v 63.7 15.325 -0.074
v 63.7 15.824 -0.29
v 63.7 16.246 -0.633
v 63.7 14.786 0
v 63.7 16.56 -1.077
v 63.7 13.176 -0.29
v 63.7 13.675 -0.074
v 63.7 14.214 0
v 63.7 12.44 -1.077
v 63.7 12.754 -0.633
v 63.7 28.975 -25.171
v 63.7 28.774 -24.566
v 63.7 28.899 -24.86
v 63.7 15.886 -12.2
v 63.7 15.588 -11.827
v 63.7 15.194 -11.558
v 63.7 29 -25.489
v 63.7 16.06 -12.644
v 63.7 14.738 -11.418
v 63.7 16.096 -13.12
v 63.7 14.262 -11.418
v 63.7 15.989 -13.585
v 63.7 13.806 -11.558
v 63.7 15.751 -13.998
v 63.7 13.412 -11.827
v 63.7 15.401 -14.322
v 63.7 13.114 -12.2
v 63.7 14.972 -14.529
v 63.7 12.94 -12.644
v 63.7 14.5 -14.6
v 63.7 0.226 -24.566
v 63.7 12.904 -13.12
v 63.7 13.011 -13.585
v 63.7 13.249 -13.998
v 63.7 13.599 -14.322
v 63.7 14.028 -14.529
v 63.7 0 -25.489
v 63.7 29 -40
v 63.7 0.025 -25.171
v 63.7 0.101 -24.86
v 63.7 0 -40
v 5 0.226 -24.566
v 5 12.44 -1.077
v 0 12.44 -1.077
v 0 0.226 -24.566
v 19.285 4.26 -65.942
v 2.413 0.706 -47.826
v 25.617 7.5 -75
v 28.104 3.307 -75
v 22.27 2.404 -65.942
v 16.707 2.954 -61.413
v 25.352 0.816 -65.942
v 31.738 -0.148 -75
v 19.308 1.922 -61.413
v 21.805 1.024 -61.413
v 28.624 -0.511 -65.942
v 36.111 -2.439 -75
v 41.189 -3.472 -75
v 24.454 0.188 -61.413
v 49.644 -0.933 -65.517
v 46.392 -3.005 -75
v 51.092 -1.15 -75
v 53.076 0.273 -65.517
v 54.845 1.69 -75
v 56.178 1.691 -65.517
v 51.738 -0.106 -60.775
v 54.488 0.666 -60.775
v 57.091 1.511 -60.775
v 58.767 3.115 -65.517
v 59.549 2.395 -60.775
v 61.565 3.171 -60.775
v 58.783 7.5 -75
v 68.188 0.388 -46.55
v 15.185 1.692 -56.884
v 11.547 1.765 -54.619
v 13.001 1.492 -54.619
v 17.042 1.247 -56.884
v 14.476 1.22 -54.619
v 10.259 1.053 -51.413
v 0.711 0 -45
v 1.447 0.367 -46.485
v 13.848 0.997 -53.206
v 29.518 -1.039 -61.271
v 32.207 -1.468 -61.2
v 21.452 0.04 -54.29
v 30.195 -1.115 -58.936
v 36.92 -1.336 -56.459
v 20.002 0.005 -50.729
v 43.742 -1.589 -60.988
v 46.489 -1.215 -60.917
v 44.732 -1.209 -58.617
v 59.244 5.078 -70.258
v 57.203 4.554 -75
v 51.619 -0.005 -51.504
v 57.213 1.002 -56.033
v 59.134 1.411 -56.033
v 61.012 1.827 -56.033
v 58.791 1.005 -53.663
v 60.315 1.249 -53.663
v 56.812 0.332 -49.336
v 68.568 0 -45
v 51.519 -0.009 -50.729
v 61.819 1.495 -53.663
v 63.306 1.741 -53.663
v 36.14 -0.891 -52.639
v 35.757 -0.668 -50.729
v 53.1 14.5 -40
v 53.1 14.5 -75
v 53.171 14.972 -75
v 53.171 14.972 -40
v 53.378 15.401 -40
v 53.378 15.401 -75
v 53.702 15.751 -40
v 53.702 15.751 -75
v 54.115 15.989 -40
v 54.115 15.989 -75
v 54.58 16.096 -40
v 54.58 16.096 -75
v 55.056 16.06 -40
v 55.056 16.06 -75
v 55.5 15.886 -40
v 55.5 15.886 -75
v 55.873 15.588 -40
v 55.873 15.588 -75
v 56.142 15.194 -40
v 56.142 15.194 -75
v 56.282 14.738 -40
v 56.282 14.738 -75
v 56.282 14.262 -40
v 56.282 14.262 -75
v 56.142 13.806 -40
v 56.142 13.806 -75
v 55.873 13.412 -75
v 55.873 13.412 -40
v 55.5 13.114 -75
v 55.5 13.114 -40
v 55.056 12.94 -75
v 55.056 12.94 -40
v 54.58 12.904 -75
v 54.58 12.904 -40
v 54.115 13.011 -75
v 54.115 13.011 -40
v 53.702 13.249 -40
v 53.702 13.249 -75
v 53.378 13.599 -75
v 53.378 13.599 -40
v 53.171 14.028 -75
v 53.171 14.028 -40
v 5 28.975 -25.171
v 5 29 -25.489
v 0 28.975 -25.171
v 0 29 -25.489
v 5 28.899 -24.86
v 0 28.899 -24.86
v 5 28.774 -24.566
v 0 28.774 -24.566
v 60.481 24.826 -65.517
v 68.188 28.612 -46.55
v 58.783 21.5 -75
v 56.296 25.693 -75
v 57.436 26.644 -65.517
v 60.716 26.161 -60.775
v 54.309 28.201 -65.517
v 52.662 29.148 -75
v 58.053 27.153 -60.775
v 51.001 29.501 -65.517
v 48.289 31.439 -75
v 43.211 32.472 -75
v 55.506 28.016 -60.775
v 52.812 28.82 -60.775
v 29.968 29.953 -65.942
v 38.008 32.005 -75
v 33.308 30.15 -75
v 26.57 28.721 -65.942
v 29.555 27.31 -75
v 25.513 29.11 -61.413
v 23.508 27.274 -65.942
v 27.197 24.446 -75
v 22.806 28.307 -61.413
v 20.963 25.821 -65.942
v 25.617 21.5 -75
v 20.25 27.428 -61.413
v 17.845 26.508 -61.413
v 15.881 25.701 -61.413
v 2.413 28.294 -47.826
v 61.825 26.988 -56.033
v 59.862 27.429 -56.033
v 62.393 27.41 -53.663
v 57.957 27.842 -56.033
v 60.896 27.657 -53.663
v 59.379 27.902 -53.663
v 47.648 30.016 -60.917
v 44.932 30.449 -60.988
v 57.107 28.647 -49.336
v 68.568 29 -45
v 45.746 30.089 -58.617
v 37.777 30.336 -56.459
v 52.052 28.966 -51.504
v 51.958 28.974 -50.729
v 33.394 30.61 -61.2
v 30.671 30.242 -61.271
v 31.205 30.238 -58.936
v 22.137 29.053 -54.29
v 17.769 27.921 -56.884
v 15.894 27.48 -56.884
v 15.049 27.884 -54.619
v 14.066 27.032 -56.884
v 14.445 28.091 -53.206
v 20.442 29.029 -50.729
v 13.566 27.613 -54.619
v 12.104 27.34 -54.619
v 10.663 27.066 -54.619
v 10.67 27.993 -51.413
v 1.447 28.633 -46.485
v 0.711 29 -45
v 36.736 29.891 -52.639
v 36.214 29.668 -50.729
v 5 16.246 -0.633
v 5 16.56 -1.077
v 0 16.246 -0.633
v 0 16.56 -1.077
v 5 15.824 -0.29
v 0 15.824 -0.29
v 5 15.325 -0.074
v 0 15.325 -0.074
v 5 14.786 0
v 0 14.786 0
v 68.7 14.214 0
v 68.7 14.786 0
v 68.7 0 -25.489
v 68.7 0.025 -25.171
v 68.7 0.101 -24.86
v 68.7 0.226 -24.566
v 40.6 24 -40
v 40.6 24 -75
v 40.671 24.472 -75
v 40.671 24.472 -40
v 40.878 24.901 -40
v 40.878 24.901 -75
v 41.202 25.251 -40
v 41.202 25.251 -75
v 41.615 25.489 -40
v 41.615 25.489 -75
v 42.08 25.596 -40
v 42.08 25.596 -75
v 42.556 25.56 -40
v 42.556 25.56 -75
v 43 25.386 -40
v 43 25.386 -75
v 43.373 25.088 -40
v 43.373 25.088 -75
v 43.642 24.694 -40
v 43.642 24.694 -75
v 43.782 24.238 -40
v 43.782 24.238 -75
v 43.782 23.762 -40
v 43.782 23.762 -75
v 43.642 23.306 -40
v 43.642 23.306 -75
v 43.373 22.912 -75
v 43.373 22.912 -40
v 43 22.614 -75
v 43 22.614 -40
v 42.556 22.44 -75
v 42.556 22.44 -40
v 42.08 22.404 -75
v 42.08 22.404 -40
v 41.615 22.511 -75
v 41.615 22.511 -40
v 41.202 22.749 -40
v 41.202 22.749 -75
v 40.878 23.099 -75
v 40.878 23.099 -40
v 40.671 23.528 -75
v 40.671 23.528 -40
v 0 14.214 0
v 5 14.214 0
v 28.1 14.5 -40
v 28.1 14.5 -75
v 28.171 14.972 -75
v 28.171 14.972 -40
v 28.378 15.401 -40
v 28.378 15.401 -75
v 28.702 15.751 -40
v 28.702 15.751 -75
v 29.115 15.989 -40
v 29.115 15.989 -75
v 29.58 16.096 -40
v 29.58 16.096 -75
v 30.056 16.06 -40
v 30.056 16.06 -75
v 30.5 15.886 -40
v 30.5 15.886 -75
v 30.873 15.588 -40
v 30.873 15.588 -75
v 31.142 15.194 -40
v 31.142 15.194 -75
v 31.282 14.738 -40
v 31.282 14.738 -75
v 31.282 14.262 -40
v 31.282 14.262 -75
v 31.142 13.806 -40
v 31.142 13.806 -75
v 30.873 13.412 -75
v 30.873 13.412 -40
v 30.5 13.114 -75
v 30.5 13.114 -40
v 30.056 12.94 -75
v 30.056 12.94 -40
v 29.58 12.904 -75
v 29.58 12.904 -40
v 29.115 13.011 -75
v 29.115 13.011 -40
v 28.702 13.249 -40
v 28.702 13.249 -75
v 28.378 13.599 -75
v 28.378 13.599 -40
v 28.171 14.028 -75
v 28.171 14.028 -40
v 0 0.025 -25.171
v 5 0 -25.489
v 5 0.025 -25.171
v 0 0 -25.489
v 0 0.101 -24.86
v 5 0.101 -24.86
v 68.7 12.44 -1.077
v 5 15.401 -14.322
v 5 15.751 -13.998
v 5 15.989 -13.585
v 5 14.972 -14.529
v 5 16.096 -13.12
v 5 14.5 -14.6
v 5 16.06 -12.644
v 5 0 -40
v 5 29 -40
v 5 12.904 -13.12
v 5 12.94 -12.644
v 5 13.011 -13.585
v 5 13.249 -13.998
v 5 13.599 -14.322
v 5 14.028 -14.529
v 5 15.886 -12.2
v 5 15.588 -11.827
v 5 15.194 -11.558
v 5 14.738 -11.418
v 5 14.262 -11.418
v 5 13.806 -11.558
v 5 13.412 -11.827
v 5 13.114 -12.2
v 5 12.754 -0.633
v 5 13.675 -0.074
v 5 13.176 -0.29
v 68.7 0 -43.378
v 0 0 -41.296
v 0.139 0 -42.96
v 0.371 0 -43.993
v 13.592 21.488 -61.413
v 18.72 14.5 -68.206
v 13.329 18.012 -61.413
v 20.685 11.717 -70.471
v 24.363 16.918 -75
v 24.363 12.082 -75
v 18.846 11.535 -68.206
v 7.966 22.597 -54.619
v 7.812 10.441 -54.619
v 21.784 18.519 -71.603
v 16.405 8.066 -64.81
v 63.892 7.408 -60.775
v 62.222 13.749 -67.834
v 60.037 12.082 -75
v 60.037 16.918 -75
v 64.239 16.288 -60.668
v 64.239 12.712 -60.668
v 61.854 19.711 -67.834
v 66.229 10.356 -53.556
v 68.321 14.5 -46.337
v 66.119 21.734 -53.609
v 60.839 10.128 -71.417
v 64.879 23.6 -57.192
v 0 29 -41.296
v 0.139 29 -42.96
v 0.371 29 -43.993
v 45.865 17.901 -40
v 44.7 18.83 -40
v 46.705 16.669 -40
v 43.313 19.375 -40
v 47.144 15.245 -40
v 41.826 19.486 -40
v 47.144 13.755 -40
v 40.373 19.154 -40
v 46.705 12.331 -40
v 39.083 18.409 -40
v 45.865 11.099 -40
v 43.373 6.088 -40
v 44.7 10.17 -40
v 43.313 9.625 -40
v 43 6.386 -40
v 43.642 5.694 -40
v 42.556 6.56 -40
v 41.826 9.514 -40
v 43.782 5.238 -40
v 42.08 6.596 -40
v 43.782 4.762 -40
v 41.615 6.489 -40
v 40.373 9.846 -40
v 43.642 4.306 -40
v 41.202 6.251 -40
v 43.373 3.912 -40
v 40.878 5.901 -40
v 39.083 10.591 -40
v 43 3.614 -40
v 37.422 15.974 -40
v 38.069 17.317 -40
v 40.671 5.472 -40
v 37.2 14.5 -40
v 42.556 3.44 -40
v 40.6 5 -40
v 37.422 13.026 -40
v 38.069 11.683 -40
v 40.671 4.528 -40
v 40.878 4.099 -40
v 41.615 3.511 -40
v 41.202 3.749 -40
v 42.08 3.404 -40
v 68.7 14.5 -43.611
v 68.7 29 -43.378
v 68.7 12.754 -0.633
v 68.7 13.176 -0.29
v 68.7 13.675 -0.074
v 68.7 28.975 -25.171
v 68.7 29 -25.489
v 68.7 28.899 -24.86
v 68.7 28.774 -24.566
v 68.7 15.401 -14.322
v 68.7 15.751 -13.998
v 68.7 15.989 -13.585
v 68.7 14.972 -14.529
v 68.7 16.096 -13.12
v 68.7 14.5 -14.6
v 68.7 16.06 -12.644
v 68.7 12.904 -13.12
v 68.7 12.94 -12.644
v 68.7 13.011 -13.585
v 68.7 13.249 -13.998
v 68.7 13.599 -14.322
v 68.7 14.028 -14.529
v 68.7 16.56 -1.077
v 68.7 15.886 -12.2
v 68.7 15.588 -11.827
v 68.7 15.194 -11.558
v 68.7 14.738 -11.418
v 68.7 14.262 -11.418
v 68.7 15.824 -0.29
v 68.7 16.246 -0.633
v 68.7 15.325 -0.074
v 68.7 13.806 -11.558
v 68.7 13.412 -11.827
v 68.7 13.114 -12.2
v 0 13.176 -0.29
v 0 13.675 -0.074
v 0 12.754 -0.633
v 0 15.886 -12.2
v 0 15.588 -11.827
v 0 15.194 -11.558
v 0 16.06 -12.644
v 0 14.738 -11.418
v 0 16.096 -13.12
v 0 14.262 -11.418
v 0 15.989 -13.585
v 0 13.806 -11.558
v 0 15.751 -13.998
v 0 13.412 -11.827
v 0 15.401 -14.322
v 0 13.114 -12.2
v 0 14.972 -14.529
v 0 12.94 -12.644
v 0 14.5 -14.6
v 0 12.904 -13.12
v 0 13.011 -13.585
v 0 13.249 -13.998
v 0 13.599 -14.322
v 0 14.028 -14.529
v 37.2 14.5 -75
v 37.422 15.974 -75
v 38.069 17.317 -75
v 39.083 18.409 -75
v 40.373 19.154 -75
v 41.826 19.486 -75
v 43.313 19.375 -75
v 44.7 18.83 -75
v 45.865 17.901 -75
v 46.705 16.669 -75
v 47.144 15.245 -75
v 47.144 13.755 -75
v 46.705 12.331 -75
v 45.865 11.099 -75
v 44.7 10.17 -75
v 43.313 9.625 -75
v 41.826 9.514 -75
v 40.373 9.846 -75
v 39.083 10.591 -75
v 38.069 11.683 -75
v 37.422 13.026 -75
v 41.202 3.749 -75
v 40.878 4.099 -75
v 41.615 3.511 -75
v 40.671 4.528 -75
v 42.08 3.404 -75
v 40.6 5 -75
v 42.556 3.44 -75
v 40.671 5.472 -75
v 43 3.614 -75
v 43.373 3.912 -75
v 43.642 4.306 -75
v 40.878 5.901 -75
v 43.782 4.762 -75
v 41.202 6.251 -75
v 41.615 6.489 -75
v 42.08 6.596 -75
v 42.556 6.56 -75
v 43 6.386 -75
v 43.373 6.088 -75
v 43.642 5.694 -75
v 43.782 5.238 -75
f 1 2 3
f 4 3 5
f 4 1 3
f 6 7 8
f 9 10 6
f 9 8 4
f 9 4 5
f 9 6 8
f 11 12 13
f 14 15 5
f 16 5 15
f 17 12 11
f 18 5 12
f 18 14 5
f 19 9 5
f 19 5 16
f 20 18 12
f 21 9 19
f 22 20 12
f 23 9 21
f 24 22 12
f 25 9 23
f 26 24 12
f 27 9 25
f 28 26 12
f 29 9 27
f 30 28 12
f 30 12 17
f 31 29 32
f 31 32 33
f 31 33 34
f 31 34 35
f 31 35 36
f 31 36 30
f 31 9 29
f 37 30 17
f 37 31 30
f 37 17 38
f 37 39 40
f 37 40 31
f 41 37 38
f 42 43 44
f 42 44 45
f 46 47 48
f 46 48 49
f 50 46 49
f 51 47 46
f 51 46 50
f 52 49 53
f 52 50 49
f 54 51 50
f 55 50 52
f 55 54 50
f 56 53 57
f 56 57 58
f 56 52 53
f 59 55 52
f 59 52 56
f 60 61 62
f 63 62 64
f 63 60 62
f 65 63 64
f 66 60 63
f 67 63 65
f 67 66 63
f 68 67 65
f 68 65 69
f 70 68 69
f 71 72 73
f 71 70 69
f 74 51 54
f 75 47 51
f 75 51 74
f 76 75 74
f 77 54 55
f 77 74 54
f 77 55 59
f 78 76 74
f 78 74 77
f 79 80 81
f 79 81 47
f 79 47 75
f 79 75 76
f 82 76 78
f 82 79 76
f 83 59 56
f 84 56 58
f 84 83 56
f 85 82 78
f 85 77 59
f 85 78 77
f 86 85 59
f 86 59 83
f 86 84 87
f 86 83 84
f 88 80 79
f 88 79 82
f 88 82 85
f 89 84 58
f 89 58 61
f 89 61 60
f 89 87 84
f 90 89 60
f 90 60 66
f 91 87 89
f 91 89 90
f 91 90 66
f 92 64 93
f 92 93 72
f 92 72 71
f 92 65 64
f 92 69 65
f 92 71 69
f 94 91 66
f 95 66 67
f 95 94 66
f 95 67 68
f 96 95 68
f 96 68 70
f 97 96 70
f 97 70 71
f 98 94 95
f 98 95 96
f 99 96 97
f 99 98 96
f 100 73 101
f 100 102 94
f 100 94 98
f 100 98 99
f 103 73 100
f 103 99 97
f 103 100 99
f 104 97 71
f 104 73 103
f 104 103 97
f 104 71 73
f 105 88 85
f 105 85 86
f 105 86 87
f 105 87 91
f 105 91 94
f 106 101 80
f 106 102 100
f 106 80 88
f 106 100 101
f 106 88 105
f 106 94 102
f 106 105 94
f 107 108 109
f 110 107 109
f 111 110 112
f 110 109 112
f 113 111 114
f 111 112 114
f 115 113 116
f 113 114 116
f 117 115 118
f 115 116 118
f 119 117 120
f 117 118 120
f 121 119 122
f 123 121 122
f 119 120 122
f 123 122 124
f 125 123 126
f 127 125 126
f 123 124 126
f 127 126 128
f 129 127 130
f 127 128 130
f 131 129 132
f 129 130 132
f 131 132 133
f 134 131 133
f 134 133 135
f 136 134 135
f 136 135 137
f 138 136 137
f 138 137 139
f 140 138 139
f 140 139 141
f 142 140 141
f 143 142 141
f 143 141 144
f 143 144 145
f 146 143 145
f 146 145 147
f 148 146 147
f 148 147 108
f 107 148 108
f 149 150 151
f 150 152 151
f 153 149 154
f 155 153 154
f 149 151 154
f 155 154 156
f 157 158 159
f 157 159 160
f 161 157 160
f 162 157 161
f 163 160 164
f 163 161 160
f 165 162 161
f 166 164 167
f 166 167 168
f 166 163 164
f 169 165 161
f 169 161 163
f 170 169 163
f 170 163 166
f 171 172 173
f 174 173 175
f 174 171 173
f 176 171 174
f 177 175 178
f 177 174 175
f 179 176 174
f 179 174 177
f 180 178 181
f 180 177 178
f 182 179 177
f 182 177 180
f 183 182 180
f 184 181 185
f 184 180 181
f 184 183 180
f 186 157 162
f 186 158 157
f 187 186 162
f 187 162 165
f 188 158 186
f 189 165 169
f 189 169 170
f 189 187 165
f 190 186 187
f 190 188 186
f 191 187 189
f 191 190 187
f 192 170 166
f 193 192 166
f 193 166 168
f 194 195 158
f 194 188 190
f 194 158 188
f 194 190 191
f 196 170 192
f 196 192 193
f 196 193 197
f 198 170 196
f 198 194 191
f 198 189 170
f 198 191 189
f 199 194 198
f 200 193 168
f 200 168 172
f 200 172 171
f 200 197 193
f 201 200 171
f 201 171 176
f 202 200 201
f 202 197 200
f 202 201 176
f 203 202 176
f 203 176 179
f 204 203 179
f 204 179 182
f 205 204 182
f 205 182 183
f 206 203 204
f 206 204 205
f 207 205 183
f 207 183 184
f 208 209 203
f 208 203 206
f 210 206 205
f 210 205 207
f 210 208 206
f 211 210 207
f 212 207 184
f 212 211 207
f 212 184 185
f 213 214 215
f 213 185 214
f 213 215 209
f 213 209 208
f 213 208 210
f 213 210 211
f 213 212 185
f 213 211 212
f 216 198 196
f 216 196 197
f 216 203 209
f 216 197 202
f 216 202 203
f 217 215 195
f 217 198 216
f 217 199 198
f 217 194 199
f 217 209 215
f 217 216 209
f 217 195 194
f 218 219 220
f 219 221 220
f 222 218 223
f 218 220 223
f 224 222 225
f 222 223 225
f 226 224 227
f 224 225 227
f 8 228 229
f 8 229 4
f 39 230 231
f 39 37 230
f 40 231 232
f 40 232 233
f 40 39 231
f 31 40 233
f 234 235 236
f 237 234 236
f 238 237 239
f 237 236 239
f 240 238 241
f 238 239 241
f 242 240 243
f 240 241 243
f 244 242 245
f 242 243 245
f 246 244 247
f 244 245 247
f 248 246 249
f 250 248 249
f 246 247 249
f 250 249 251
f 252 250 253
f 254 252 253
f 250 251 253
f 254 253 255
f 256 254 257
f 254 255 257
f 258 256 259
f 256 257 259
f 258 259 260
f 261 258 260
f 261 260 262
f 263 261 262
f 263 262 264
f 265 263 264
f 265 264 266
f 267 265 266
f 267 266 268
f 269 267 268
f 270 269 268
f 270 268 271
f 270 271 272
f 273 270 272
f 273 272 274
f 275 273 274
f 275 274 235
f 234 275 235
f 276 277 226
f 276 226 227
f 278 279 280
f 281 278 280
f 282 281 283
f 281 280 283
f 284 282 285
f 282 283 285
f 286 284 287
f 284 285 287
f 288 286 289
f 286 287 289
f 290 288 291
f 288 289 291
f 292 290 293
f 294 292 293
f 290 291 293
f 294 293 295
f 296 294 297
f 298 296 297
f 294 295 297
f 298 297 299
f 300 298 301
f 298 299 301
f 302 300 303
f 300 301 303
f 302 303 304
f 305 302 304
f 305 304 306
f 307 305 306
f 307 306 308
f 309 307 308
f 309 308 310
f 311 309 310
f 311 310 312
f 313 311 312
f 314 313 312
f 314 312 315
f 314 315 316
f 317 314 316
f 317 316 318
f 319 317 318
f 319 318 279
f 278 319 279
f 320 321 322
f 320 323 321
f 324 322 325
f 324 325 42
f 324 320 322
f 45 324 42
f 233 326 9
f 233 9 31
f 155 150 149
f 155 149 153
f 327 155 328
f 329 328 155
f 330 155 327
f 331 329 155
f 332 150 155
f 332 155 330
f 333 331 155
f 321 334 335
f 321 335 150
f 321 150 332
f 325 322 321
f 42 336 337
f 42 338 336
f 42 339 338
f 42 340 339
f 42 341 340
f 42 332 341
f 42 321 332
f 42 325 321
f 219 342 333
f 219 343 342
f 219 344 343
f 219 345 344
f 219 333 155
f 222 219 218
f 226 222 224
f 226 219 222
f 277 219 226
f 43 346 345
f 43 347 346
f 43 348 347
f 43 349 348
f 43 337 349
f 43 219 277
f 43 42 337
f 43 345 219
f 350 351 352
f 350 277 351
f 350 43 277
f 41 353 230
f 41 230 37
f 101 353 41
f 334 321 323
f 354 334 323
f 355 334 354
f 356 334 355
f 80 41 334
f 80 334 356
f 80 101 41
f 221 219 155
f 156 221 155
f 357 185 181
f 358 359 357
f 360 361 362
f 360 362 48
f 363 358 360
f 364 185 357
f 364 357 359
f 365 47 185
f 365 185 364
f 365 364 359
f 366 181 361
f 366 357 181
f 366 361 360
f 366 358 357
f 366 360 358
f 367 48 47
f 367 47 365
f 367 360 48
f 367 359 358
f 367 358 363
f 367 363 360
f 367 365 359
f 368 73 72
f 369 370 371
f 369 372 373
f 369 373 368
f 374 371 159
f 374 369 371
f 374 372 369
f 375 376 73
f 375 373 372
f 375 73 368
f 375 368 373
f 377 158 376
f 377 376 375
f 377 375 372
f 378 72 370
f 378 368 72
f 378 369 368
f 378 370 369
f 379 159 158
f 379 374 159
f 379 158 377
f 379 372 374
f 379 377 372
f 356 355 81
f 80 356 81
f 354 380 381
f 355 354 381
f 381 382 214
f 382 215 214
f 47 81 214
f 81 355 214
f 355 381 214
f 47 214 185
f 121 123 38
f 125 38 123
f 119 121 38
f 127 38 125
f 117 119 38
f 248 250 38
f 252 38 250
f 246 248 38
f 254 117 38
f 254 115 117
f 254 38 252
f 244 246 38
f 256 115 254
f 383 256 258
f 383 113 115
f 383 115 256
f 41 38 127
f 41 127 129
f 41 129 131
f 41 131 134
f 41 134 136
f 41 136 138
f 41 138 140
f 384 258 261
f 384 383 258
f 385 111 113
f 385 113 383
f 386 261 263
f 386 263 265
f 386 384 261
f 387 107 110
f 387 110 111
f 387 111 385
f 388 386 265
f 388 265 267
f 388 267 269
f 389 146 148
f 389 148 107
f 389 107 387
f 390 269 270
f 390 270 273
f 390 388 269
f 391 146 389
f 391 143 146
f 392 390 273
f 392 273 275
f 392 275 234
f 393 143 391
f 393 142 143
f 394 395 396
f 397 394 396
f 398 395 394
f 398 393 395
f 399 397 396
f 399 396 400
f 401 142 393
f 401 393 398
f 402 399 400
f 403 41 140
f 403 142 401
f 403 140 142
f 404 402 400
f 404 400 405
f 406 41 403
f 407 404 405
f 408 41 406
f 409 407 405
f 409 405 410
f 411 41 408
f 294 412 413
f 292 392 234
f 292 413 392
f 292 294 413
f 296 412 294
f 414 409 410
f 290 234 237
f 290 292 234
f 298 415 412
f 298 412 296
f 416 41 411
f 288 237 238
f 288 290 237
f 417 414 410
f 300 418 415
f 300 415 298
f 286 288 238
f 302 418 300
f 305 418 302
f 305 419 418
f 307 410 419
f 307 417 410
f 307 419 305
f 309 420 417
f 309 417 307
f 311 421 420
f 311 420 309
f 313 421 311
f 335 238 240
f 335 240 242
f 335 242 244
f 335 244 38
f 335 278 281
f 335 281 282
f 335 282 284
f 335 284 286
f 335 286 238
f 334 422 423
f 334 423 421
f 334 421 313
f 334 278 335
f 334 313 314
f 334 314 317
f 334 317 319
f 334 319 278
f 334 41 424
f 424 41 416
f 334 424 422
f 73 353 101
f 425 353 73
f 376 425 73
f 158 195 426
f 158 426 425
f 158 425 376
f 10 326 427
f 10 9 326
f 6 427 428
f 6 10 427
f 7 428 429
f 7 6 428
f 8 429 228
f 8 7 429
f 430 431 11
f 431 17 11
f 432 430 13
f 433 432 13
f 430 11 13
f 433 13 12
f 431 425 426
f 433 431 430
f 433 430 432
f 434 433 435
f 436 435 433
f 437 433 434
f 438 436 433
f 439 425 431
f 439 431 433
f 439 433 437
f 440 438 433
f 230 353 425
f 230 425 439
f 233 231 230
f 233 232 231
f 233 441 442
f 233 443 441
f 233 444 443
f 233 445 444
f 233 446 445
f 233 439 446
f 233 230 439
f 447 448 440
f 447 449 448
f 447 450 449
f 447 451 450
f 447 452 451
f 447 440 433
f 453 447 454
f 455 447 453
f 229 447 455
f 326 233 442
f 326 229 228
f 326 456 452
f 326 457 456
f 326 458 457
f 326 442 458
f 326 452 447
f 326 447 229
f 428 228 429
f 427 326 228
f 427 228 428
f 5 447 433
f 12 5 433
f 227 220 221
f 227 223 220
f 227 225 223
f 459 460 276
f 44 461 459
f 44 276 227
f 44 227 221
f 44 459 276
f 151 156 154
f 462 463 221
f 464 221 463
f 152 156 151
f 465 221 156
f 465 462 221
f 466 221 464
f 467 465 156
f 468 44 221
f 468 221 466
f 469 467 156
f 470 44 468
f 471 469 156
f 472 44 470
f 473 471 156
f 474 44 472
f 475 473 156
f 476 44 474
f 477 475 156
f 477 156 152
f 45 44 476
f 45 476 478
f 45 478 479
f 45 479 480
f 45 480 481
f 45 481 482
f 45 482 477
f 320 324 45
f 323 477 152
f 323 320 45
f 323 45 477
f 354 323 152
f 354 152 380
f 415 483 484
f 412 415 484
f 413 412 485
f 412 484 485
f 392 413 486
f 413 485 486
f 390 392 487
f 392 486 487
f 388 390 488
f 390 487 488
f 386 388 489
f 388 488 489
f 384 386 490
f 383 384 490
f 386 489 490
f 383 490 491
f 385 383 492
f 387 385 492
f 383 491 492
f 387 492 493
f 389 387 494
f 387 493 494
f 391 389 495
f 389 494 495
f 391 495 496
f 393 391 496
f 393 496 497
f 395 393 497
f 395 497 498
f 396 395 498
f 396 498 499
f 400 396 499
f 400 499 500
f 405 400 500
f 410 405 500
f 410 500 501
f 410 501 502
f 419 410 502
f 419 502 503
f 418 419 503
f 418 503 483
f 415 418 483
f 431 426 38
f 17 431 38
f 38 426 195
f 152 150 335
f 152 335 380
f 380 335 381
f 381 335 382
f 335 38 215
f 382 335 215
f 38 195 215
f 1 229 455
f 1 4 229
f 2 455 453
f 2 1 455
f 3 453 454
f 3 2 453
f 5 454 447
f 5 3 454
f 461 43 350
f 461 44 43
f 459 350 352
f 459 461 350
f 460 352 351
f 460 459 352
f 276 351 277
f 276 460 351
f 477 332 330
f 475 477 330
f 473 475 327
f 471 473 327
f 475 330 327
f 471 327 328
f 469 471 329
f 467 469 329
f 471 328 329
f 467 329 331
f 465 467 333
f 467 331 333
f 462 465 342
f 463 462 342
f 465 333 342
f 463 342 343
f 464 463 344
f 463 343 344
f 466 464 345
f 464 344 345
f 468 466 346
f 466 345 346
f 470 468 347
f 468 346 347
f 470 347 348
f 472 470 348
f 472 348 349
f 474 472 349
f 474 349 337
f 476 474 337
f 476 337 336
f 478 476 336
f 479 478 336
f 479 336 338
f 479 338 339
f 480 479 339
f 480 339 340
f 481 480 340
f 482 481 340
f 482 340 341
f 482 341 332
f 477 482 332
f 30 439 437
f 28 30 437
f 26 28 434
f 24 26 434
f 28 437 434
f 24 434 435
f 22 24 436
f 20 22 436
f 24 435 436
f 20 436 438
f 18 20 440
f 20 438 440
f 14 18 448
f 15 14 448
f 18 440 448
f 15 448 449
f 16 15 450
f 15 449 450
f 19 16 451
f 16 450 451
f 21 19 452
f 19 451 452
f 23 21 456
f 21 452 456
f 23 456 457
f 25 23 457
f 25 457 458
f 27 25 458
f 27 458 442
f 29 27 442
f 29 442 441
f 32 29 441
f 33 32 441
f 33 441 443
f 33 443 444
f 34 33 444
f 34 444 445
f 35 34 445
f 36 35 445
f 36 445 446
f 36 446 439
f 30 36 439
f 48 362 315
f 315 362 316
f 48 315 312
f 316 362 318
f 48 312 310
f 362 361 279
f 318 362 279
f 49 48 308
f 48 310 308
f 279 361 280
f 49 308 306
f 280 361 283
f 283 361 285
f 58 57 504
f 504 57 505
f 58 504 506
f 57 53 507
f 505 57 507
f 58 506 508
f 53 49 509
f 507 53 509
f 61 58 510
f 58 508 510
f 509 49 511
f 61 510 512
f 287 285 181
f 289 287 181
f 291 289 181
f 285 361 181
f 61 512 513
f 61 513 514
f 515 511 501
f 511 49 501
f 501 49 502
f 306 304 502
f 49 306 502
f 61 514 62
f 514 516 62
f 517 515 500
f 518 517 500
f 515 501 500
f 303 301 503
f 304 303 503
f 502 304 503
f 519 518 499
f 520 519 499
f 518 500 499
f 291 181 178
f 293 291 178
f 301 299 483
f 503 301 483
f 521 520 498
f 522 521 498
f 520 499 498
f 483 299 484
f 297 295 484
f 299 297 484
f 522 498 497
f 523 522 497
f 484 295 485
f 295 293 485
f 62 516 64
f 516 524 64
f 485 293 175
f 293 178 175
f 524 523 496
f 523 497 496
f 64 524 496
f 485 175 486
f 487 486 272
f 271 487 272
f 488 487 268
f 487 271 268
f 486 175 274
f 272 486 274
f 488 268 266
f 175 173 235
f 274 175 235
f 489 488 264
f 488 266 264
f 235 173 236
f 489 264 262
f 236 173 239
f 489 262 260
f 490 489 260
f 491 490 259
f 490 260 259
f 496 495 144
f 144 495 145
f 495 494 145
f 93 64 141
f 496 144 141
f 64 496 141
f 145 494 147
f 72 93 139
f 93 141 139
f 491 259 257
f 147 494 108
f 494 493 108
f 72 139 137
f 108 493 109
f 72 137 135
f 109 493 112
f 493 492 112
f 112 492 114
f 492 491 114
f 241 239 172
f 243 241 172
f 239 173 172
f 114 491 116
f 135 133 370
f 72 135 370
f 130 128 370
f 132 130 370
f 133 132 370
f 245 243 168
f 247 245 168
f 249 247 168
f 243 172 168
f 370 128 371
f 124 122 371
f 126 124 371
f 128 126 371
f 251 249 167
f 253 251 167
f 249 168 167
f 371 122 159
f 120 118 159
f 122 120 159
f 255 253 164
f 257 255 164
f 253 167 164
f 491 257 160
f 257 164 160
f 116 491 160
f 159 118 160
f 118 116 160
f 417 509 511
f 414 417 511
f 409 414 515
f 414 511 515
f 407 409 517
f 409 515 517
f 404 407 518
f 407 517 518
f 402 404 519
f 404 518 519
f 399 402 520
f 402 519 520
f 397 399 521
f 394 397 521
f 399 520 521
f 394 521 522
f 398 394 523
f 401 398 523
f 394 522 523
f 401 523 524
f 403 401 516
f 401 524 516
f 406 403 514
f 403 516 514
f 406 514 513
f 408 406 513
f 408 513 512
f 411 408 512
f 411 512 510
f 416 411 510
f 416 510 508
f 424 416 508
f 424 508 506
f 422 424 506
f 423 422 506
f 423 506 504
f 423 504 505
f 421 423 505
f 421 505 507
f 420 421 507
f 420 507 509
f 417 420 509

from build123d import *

# Parameters (mm, degrees)
BOSS_EXTRUDE1_DEPTH = 29
SKETCH2_R           = 1.6
CUT_EXTRUDE1_DEPTH  = 88.095866722
SKETCH8_R           = 5
SKETCH8_R_2         = 1.6
CUT_EXTRUDE3_DEPTH  = 107.775184478
CUT_EXTRUDE4_DEPTH  = 107.775184548
FILLET1_R           = 2
FILLET2_R           = 10


with BuildPart() as part:
    # Sketch1 → Boss-Extrude1 (new body)
    with BuildSketch(Plane(origin=(0, 0, 0), x_dir=(1, 0, 0), z_dir=(0, 1, 0))):
        Polygon((0, 0), (0, 45), (68.7, 45), (68.7, 0), (63.7, 0), (63.7, 40), (5, 40), (5, 0), align=None)
    extrude(amount=BOSS_EXTRUDE1_DEPTH)

    # Sketch2 → Cut-Extrude1 (cut, through all)
    with BuildSketch(Plane(origin=(68.7, 0, 0), x_dir=(0, 0, -1), z_dir=(1, 0, 0))):
        with Locations((13, 14.5)):
            Circle(SKETCH2_R)
    extrude(amount=-CUT_EXTRUDE1_DEPTH, mode=Mode.SUBTRACT)

    # Loft2: read off the stored shape, not the designer's step
    # Loft2: loft between two sections, ruled curve by curve
    loft2_from = [
        Edge.make_bspline([(58.7830687, 7.499869108, -75), (59.236789371, 8.574717733, -75), (59.594121179, 9.715673973, -75), (60.075863556, 12.071270035, -75), (60.2, 13.285510166, -75), (60.2, 15.714489834, -75), (60.075863556, 16.928729965, -75), (59.594121179, 19.284326027, -75), (59.236789371, 20.425282267, -75), (58.7830687, 21.500130892, -75)], [0, 0, 0, 0, 0.25, 0.25, 0.5, 0.5, 0.75, 0.75, 1, 1, 1, 1], 3),
        Edge.make_bspline([(58.7830687, 21.500130892, -75), (58.245644387, 22.773270556, -75), (57.518678604, 24.085542636, -75), (56.075347645, 25.993948982, -75), (55.535761632, 26.619337811, -75), (54.335762543, 27.820816595, -75), (53.675268026, 28.396824058, -75), (52.237826073, 29.468150951, -75), (51.460832799, 29.963342143, -75), (49.805218581, 30.841316492, -75), (48.926615313, 31.223945338, -75), (47.093581696, 31.849079498, -75), (46.13924648, 32.091442444, -75), (44.189865052, 32.41694581, -75), (43.194978913, 32.5, -75), (41.205021087, 32.5, -75), (40.210134948, 32.41694581, -75), (38.26075352, 32.091442444, -75), (37.306418304, 31.849079498, -75), (35.473384687, 31.223945338, -75), (34.594781419, 30.841316492, -75), (32.939167201, 29.963342143, -75), (32.162173927, 29.468150951, -75), (30.724731974, 28.396824058, -75), (30.064237457, 27.820816595, -75), (28.864238368, 26.619337811, -75), (28.324652355, 25.993948982, -75), (26.881321396, 24.085542636, -75), (26.154355613, 22.773270556, -75), (25.6169313, 21.500130892, -75)], [0, 0, 0, 0, 0.125, 0.125, 0.1875, 0.1875, 0.25, 0.25, 0.3125, 0.3125, 0.375, 0.375, 0.4375, 0.4375, 0.5, 0.5, 0.5625, 0.5625, 0.625, 0.625, 0.6875, 0.6875, 0.75, 0.75, 0.8125, 0.8125, 0.875, 0.875, 1, 1, 1, 1], 3),
        Edge.make_bspline([(25.6169313, 7.499869108, -75), (26.154355613, 6.226729444, -75), (26.881321396, 4.914457364, -75), (28.324652355, 3.006051018, -75), (28.864238368, 2.380662189, -75), (30.064237457, 1.179183405, -75), (30.724731974, 0.603175942, -75), (32.162173927, -0.468150951, -75), (32.939167201, -0.963342143, -75), (34.594781419, -1.841316492, -75), (35.473384687, -2.223945338, -75), (37.306418304, -2.849079498, -75), (38.26075352, -3.091442444, -75), (40.210134948, -3.41694581, -75), (41.205021087, -3.5, -75), (43.194978913, -3.5, -75), (44.189865052, -3.41694581, -75), (46.13924648, -3.091442444, -75), (47.093581696, -2.849079498, -75), (48.926615313, -2.223945338, -75), (49.805218581, -1.841316492, -75), (51.460832799, -0.963342143, -75), (52.237826073, -0.468150951, -75), (53.675268026, 0.603175942, -75), (54.335762543, 1.179183405, -75), (55.535761632, 2.380662189, -75), (56.075347645, 3.006051018, -75), (57.518678604, 4.914457364, -75), (58.245644387, 6.226729444, -75), (58.7830687, 7.499869108, -75)], [0, 0, 0, 0, 0.125, 0.125, 0.1875, 0.1875, 0.25, 0.25, 0.3125, 0.3125, 0.375, 0.375, 0.4375, 0.4375, 0.5, 0.5, 0.5625, 0.5625, 0.625, 0.625, 0.6875, 0.6875, 0.75, 0.75, 0.8125, 0.8125, 0.875, 0.875, 1, 1, 1, 1], 3),
        Edge.make_bspline([(25.6169313, 21.500130892, -75), (25.163210629, 20.425282267, -75), (24.805878821, 19.284326027, -75), (24.324136444, 16.928729965, -75), (24.2, 15.714489834, -75), (24.2, 13.285510166, -75), (24.324136444, 12.071270035, -75), (24.805878821, 9.715673973, -75), (25.163210629, 8.574717733, -75), (25.6169313, 7.499869108, -75)], [0, 0, 0, 0, 0.25, 0.25, 0.5, 0.5, 0.75, 0.75, 1, 1, 1, 1], 3),
    ]
    loft2_to = [
        Edge.make_bspline([(68.7, 0, -45), (68.7, 2.416666667, -45), (68.7, 4.833333333, -45), (68.7, 9.666666667, -45), (68.7, 12.083333333, -45), (68.7, 16.916666667, -45), (68.7, 19.333333333, -45), (68.7, 24.166666667, -45), (68.7, 26.583333333, -45), (68.7, 29, -45)], [0, 0, 0, 0, 0.25, 0.25, 0.5, 0.5, 0.75, 0.75, 1, 1, 1, 1], 3),
        Edge.make_bspline([(68.7, 29, -45), (65.8375, 29, -45), (62.975, 29, -45), (58.68125, 29, -45), (57.25, 29, -45), (54.3875, 29, -45), (52.95625, 29, -45), (50.09375, 29, -45), (48.6625, 29, -45), (45.8, 29, -45), (44.36875, 29, -45), (41.50625, 29, -45), (40.075, 29, -45), (37.2125, 29, -45), (35.78125, 29, -45), (32.91875, 29, -45), (31.4875, 29, -45), (28.625, 29, -45), (27.19375, 29, -45), (24.33125, 29, -45), (22.9, 29, -45), (20.0375, 29, -45), (18.60625, 29, -45), (15.74375, 29, -45), (14.3125, 29, -45), (11.45, 29, -45), (10.01875, 29, -45), (5.725, 29, -45), (2.8625, 29, -45), (0, 29, -45)], [0, 0, 0, 0, 0.125, 0.125, 0.1875, 0.1875, 0.25, 0.25, 0.3125, 0.3125, 0.375, 0.375, 0.4375, 0.4375, 0.5, 0.5, 0.5625, 0.5625, 0.625, 0.625, 0.6875, 0.6875, 0.75, 0.75, 0.8125, 0.8125, 0.875, 0.875, 1, 1, 1, 1], 3),
        Edge.make_bspline([(0, 0, -45), (2.8625, 0, -45), (5.725, 0, -45), (10.01875, 0, -45), (11.45, 0, -45), (14.3125, 0, -45), (15.74375, 0, -45), (18.60625, 0, -45), (20.0375, 0, -45), (22.9, 0, -45), (24.33125, 0, -45), (27.19375, 0, -45), (28.625, 0, -45), (31.4875, 0, -45), (32.91875, 0, -45), (35.78125, 0, -45), (37.2125, 0, -45), (40.075, 0, -45), (41.50625, 0, -45), (44.36875, 0, -45), (45.8, 0, -45), (48.6625, 0, -45), (50.09375, 0, -45), (52.95625, 0, -45), (54.3875, 0, -45), (57.25, 0, -45), (58.68125, 0, -45), (62.975, 0, -45), (65.8375, 0, -45), (68.7, 0, -45)], [0, 0, 0, 0, 0.125, 0.125, 0.1875, 0.1875, 0.25, 0.25, 0.3125, 0.3125, 0.375, 0.375, 0.4375, 0.4375, 0.5, 0.5, 0.5625, 0.5625, 0.625, 0.625, 0.6875, 0.6875, 0.75, 0.75, 0.8125, 0.8125, 0.875, 0.875, 1, 1, 1, 1], 3),
        Edge.make_bspline([(0, 29, -45), (0, 26.583333333, -45), (0, 24.166666667, -45), (0, 19.333333333, -45), (0, 16.916666667, -45), (0, 12.083333333, -45), (0, 9.666666667, -45), (0, 4.833333333, -45), (0, 2.416666667, -45), (0, 0, -45)], [0, 0, 0, 0, 0.25, 0.25, 0.5, 0.5, 0.75, 0.75, 1, 1, 1, 1], 3),
    ]
    loft2 = Solid(Shell([*[Face.make_surface_from_curves(loft2_from[k], loft2_to[k]) for k in range(4)], Face(Wire(loft2_from)), Face(Wire(loft2_to))]))
    add(loft2)

    # Sketch8 → Cut-Extrude3 (cut, through all)
    with BuildSketch(Plane(origin=(0, 0, -75), x_dir=(-1, 0, 0), z_dir=(0, 0, -1))):
        with Locations((-42.2, 14.5)):
            Circle(SKETCH8_R)
        with Locations((-42.2, 24)):
            Circle(SKETCH8_R_2)
        with Locations((-29.7, 14.5)):
            Circle(SKETCH8_R_2)
        with Locations((-42.2, 5)):
            Circle(SKETCH8_R_2)
        with Locations((-54.7, 14.5)):
            Circle(SKETCH8_R_2)
    extrude(amount=-CUT_EXTRUDE3_DEPTH, mode=Mode.SUBTRACT)

    # Sketch9 → Cut-Extrude4 (cut, through all)
    with BuildSketch(Plane(origin=(68.7, 0, 0), x_dir=(0, 0, -1), z_dir=(1, 0, 0))):
        Polygon((0, 13), (25, 0), (0, 0), align=None)
        Polygon((0, 16), (25, 29), (0, 29), align=None)
    extrude(amount=-CUT_EXTRUDE4_DEPTH, mode=Mode.SUBTRACT)

    # Fillet1
    fillet1_edges = [part.edges().sort_by_distance(p)[0] for p in [
        (2.5, 16, 0),
        (66.2, 16, 0),
        (66.2, 0, -25),
        (2.5, 0, -25),
        (66.2, 29, -25),
        (2.5, 29, -25),
        (2.5, 13, 0),
        (66.2, 13, 0),
    ]]
    fillet(fillet1_edges, radius=FILLET1_R)

    # Fillet2
    fillet2_edges = [part.edges().sort_by_distance(p)[0] for p in [
        (68.7, 14.5, -45),
        (0, 14.5, -45),
    ]]
    fillet(fillet2_edges, radius=FILLET2_R)


solid = part.part
